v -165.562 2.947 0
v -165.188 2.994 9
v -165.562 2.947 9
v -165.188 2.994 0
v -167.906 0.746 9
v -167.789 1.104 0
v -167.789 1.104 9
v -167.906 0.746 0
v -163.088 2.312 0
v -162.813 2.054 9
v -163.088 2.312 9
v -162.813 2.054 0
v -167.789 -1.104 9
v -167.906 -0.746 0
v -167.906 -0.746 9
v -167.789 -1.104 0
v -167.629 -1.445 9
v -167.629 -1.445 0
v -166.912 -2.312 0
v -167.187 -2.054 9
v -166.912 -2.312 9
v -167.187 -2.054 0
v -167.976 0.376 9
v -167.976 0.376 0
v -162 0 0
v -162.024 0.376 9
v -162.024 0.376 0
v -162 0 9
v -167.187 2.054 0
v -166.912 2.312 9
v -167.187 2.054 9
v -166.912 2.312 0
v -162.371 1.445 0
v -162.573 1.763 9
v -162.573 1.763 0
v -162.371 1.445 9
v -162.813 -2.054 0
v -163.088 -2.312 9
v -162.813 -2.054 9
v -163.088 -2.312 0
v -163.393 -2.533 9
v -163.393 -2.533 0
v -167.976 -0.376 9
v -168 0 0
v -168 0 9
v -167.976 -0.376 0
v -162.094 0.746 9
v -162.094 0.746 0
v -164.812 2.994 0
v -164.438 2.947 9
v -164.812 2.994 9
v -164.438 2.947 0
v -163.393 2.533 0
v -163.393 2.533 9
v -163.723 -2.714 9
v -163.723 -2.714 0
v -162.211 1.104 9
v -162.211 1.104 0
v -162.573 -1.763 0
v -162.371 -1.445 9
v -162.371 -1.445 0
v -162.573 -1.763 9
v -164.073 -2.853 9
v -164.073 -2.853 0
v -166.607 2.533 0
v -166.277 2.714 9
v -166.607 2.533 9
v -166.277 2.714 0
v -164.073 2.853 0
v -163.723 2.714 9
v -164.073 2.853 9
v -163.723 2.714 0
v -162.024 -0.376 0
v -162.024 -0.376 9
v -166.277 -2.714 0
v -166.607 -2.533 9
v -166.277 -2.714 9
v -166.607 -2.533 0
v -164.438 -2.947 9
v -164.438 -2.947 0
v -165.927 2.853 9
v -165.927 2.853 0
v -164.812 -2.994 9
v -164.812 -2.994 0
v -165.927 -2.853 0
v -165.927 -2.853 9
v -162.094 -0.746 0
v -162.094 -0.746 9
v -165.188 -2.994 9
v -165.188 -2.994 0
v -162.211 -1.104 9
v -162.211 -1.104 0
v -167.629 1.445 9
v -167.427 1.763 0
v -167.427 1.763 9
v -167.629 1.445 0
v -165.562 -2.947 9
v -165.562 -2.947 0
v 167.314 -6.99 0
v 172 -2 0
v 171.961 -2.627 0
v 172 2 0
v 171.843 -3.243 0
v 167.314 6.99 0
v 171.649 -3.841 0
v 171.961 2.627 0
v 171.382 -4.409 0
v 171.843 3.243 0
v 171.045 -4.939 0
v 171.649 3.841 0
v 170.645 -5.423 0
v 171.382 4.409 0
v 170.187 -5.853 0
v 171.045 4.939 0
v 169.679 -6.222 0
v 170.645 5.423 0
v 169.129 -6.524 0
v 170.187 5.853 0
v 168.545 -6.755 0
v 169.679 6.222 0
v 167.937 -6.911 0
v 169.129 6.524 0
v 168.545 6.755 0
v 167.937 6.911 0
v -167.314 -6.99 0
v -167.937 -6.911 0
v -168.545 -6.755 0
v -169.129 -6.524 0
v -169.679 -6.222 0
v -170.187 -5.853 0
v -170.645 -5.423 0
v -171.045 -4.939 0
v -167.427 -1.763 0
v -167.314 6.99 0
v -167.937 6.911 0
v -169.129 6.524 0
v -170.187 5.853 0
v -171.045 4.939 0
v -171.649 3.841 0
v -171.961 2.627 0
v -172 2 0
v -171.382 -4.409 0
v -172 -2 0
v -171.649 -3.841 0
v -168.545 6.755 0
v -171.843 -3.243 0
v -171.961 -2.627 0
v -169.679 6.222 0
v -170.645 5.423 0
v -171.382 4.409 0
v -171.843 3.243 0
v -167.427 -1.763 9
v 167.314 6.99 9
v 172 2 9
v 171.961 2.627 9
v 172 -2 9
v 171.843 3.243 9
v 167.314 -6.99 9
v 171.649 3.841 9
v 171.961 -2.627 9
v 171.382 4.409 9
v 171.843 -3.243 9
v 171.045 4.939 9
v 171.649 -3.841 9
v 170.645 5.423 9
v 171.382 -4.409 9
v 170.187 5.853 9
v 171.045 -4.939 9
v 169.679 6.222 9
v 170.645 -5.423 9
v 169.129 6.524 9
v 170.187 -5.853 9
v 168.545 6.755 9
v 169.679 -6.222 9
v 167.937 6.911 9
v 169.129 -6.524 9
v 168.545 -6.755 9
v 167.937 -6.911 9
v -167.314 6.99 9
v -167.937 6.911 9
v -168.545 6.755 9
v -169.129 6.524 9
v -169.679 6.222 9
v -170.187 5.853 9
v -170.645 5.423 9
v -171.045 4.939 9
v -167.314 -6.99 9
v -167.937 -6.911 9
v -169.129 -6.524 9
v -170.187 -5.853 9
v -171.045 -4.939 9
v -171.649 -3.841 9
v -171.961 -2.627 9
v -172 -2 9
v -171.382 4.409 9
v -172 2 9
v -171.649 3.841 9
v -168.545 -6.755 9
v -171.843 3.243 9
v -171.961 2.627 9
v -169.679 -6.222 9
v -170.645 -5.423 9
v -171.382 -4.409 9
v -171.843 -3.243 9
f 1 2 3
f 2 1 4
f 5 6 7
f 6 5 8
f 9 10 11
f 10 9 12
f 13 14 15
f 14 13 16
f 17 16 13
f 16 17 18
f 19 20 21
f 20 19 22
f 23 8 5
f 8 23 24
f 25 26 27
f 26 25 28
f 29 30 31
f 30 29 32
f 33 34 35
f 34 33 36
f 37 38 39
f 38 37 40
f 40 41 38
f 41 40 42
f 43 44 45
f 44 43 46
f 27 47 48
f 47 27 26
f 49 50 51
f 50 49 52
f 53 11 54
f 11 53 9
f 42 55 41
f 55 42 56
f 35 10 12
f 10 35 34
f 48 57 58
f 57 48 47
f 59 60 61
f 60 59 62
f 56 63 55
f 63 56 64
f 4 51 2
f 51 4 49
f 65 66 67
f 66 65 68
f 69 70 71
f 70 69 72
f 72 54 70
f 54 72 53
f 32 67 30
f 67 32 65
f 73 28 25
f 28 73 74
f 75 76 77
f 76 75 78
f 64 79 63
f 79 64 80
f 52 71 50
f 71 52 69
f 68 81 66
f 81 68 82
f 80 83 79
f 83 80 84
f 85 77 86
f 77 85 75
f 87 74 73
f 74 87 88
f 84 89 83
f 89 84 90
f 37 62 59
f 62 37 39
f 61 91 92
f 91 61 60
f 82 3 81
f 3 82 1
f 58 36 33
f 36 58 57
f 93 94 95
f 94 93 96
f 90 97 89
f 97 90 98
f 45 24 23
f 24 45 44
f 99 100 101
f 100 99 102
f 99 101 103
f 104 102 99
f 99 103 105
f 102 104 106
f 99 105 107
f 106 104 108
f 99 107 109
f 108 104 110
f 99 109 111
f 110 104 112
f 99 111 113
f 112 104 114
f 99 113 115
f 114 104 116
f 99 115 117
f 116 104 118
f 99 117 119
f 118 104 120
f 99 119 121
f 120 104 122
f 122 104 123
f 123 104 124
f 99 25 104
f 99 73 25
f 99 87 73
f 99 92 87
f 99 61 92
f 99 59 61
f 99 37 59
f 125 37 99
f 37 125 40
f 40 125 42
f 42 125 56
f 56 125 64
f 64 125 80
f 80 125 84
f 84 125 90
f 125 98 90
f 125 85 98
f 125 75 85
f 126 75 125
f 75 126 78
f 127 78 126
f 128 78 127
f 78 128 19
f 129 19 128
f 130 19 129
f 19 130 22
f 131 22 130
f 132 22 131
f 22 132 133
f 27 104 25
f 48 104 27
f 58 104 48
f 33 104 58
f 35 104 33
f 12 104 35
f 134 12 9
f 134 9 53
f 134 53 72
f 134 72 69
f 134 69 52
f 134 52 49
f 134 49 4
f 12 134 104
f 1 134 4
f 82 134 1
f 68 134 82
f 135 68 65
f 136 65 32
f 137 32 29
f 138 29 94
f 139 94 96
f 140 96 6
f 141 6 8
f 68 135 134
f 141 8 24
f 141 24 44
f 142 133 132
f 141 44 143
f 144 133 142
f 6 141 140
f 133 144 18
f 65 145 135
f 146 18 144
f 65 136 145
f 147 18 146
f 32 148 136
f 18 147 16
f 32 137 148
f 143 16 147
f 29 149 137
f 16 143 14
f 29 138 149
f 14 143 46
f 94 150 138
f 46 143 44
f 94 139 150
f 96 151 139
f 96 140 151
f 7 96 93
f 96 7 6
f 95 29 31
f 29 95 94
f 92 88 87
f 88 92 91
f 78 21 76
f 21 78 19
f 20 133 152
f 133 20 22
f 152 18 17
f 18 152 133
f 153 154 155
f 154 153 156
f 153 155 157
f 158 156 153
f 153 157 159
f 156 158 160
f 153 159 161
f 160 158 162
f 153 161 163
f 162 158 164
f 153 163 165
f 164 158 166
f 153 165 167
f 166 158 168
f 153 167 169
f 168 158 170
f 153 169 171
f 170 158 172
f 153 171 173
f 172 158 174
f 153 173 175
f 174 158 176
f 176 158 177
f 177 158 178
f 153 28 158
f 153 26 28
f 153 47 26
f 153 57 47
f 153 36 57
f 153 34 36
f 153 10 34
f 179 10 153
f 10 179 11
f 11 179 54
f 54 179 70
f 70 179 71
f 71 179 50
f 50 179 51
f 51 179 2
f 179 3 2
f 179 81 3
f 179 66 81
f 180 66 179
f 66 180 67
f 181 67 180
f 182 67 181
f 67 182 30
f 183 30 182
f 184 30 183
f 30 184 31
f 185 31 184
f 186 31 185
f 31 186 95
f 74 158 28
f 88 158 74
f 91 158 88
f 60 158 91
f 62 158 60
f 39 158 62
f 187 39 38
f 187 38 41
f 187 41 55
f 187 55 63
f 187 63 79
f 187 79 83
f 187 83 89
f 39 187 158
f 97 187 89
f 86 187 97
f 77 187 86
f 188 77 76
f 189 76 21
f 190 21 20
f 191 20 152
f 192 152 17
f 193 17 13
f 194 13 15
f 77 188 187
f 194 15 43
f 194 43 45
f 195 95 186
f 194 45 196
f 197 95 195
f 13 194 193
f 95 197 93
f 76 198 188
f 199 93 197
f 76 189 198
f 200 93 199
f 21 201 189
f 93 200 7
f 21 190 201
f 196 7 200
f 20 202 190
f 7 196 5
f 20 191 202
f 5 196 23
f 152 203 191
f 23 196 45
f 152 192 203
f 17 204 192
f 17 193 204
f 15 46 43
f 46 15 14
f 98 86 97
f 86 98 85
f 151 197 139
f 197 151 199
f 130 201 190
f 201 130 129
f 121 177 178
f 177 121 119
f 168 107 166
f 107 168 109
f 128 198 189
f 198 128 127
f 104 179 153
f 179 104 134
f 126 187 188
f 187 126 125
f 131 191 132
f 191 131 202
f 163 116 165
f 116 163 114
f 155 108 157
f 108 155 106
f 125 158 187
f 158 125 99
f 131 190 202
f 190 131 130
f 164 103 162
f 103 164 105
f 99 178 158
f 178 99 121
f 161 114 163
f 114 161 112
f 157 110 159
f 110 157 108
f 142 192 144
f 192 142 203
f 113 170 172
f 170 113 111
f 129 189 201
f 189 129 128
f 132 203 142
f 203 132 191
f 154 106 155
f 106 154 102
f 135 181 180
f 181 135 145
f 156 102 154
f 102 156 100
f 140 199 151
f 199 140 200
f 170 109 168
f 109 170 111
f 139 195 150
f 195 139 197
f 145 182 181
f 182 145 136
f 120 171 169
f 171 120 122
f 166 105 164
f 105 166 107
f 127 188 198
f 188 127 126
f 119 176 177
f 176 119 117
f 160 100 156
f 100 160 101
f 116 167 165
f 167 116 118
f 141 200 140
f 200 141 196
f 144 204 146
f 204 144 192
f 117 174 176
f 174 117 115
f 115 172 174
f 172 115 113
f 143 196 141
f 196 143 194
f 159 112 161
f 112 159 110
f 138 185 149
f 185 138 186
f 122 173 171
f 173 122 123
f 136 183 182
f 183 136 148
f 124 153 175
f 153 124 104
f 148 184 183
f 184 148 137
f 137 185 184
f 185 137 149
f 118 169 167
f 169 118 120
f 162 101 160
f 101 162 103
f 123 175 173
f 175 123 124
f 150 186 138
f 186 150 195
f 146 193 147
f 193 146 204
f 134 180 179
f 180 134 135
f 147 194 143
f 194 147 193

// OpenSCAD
$fn = 50;


difference() {
	union() {
		hull() {
			translate(v = [-167.0000000000, 2.0000000000, 0]) {
				cylinder(h = 9, r = 5);
			}
			translate(v = [167.0000000000, 2.0000000000, 0]) {
				cylinder(h = 9, r = 5);
			}
			translate(v = [-167.0000000000, -2.0000000000, 0]) {
				cylinder(h = 9, r = 5);
			}
			translate(v = [167.0000000000, -2.0000000000, 0]) {
				cylinder(h = 9, r = 5);
			}
		}
	}
	union() {
		translate(v = [-165.0000000000, 0.0000000000, 0]) {
			cylinder(h = 9, r = 3.0000000000);
		}
		translate(v = [-165.0000000000, 0.0000000000, 0]) {
			cylinder(h = 9, r = 1.5000000000);
		}
		translate(v = [-165.0000000000, 0.0000000000, 0]) {
			cylinder(h = 9, r = 1.5000000000);
		}
		translate(v = [-165.0000000000, 0.0000000000, 0]) {
			cylinder(h = 9, r = 1.5000000000);
		}
	}
}
